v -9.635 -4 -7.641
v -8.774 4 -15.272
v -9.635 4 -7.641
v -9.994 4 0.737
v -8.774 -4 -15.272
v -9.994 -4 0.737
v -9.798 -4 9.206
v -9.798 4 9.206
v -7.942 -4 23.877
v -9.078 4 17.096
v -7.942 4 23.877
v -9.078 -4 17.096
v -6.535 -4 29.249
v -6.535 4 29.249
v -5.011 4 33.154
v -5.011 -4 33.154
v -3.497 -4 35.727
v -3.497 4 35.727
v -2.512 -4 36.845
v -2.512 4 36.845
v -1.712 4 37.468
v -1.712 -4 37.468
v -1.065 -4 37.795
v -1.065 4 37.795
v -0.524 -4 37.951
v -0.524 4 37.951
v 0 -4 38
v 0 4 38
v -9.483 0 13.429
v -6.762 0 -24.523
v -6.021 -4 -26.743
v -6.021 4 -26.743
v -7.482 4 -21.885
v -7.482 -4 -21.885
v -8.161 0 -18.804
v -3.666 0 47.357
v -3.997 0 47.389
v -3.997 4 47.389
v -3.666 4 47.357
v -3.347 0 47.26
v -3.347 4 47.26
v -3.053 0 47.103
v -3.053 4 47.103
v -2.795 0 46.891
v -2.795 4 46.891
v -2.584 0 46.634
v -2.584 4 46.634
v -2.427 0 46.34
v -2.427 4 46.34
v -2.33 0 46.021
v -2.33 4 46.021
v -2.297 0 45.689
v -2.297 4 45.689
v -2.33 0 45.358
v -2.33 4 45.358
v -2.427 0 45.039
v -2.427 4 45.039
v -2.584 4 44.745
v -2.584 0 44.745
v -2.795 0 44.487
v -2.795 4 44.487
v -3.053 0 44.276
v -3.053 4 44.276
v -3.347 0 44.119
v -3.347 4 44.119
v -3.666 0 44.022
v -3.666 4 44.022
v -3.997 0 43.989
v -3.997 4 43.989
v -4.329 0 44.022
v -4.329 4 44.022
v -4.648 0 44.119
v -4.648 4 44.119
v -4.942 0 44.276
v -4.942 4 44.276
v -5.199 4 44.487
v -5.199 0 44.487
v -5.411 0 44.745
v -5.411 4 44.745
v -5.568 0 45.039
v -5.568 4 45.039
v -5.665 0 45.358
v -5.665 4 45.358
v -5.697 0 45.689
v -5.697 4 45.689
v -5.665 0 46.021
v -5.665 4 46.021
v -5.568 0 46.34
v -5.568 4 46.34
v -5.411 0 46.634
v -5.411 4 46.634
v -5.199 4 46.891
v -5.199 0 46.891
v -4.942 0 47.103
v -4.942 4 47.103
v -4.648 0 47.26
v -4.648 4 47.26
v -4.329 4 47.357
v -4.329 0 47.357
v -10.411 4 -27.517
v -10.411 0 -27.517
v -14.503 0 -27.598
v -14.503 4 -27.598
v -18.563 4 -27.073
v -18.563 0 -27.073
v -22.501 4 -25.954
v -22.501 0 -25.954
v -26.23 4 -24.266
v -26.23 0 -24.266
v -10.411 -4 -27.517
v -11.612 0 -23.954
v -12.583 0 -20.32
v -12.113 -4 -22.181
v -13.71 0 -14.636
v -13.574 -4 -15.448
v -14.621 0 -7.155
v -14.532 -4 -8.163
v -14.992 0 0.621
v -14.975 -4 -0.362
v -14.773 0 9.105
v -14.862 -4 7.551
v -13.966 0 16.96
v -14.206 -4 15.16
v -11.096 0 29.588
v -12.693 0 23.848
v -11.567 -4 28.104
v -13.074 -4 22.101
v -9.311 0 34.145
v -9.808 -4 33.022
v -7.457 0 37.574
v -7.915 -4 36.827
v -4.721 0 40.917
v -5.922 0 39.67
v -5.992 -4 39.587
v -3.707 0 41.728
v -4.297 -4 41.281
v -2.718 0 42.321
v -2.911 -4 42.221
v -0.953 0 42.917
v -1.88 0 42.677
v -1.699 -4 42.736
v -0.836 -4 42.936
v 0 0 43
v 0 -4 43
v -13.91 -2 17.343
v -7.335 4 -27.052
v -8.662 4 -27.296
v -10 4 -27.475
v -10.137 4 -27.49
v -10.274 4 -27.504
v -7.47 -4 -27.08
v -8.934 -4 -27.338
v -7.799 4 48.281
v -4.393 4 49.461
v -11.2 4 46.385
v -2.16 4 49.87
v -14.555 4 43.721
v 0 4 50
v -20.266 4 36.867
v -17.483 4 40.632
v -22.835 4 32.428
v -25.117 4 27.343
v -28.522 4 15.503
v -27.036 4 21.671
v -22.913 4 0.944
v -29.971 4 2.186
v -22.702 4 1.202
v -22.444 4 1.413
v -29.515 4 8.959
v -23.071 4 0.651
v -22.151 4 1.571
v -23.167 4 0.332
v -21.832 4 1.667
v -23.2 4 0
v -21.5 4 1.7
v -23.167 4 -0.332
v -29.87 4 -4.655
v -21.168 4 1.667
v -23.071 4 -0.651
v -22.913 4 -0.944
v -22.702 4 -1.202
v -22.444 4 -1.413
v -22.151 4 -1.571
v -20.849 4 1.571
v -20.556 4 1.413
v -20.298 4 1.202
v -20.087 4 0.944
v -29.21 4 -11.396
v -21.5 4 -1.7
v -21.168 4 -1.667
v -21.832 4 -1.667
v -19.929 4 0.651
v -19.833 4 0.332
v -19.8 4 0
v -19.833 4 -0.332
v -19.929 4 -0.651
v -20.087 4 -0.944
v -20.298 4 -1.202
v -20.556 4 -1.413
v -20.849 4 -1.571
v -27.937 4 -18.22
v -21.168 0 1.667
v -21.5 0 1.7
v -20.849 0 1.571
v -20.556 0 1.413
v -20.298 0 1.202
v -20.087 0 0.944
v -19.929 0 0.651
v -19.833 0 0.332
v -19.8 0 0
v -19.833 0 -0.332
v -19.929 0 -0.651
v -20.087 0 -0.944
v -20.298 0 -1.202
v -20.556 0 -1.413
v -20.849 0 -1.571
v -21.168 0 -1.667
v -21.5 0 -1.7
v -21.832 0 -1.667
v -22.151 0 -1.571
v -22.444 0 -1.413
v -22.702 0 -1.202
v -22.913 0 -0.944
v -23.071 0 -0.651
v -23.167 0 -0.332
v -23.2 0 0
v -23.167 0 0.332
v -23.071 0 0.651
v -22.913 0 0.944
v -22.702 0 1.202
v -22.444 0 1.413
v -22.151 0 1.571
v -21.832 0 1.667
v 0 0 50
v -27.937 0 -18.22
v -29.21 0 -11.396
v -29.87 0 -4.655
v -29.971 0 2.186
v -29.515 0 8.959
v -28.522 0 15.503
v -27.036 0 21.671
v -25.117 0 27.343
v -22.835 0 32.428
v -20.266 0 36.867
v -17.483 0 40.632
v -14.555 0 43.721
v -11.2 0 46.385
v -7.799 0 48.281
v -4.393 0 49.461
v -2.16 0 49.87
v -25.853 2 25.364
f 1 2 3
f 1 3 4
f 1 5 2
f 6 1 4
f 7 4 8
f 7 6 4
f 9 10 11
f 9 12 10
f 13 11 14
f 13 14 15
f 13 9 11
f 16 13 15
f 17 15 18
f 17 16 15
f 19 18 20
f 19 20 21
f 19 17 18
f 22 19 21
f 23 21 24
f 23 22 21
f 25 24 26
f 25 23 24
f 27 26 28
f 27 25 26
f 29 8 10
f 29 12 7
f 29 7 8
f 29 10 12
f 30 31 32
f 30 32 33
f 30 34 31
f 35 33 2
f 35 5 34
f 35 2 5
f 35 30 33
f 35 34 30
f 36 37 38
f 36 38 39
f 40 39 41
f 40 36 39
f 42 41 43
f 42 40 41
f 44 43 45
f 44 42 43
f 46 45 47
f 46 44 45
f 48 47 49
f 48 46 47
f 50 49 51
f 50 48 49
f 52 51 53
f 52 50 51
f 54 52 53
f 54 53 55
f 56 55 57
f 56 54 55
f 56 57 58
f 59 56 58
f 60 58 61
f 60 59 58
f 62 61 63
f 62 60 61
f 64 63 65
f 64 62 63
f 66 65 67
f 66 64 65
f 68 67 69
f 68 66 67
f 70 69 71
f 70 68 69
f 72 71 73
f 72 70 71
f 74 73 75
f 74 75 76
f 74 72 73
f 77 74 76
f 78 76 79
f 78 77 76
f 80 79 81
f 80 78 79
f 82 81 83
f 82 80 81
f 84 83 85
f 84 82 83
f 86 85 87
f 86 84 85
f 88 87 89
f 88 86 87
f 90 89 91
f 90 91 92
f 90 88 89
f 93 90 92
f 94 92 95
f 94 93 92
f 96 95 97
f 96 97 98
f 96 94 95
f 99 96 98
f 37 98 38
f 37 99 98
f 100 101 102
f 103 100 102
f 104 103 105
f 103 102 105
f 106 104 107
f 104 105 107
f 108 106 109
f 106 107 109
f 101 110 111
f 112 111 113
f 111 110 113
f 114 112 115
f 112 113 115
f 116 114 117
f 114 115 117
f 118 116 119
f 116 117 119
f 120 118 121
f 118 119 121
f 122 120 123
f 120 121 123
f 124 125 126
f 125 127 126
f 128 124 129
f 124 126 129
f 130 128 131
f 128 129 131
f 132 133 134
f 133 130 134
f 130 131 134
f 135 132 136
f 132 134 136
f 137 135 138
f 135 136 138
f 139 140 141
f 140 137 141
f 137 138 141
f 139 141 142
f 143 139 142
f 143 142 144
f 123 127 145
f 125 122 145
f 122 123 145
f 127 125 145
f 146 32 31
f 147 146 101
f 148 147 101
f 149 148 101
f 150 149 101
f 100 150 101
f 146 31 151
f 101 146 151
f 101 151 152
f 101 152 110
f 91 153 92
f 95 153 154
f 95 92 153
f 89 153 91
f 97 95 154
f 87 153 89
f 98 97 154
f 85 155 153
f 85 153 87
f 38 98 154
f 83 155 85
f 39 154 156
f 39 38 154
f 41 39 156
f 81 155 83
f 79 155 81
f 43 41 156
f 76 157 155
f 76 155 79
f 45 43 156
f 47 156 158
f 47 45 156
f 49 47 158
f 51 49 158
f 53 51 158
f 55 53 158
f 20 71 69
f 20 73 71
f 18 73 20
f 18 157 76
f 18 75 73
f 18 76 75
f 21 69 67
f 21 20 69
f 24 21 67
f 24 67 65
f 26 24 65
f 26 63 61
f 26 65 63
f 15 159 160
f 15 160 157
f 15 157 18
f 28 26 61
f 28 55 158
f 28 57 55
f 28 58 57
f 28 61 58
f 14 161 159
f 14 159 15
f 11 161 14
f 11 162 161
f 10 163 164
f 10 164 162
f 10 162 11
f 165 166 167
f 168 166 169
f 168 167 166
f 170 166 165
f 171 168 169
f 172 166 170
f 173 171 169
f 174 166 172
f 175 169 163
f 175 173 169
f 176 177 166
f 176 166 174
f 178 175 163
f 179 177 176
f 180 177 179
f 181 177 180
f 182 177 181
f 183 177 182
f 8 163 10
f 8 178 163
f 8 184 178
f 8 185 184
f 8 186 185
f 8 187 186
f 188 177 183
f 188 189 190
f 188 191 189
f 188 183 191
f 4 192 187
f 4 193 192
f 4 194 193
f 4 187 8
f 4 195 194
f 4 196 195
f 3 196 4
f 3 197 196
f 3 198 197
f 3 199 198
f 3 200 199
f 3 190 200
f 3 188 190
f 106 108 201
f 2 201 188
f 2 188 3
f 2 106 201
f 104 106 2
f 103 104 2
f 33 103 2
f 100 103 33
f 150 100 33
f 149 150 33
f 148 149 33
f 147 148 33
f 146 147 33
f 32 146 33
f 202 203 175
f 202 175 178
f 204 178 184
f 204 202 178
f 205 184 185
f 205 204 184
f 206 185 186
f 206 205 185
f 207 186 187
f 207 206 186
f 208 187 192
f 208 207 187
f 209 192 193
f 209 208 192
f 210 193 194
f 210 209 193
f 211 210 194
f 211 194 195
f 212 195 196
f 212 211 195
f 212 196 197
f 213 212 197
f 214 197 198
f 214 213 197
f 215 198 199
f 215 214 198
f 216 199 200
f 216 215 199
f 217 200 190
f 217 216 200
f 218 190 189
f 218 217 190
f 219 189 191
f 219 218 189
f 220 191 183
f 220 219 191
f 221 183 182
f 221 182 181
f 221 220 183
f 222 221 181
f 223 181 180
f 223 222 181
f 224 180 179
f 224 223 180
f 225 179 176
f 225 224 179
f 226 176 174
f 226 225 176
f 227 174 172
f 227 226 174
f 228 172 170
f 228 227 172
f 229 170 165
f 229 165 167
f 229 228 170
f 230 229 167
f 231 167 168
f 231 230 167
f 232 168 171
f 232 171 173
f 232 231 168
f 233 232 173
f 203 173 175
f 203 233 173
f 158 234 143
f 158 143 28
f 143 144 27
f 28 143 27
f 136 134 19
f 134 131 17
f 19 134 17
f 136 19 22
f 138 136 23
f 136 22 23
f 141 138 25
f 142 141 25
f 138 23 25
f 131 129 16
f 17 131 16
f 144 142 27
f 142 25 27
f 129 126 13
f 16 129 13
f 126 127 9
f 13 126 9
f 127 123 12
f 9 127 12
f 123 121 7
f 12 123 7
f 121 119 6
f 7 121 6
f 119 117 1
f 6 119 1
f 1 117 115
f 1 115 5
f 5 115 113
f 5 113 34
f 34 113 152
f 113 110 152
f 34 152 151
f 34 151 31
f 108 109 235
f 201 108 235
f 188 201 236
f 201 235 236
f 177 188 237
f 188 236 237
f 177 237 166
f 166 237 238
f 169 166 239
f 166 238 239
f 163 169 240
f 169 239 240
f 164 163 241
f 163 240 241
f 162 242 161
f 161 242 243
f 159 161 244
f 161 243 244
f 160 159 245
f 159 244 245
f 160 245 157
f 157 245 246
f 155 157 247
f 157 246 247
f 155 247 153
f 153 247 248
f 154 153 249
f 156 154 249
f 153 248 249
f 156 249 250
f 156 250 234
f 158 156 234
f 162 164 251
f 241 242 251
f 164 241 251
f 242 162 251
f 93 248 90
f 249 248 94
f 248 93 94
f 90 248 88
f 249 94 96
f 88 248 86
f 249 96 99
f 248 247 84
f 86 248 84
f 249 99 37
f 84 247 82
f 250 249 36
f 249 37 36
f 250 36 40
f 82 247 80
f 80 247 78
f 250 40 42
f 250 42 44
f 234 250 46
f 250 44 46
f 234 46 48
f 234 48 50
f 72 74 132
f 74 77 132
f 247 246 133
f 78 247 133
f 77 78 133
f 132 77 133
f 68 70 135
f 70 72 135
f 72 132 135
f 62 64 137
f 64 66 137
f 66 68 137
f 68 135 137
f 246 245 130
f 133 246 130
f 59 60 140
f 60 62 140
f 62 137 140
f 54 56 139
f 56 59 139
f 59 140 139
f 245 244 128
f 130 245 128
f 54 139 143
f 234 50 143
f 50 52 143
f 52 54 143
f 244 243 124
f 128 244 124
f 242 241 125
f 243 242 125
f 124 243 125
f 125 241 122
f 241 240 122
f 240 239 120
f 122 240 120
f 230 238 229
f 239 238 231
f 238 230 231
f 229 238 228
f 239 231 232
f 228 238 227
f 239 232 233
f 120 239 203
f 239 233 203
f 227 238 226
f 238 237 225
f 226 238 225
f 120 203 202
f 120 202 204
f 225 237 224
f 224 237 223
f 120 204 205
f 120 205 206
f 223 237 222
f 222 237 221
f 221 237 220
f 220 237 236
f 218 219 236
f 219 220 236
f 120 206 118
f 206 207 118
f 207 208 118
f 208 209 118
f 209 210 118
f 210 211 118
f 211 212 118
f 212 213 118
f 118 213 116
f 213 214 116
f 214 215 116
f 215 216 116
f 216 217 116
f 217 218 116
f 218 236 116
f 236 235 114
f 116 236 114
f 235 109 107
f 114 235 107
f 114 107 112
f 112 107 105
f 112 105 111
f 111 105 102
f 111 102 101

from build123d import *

# Parameters (mm, degrees)
SKETCH_1_R      = 1.7
EXTRUDE_1_DEPTH = 4
EXTRUDE_START   = -8
EXTRUDE_2_DEPTH = 8


with BuildPart() as part:
    # Эскиз1 → Бобышка-Вытянуть1 (new body)
    with BuildSketch(Plane(origin=(0, 0, 0), x_dir=(1, 0, 0), z_dir=(0, 1, 0))):
        with BuildLine():
            Line((0, -50), (0, -43))
            add(Edge.make_bspline(
                [(-10.000145873, 27.475174978), (-27.697978685, -43), (0, -43)],
                knots=[4.019246634, 4.019246634, 4.019246634, 6.283185307, 6.283185307, 6.283185307], degree=2, weights=[1, 0.42487789, 1]))
            ThreePointArc((-10.000145873, 27.475174978), (-18.360814479, 27.113576543), (-26.230013338, 24.266254592))
            add(Edge.make_bspline(
                [(-26.230013338, 24.266254592), (-50.964235719, -50), (0, -50)],
                knots=[4.205654034, 4.205654034, 4.205654034, 6.283185307, 6.283185307, 6.283185307], degree=2, weights=[1, 0.507284392, 1]))
        make_face()
        with Locations(Location((-3.997292475, -45.689262056, 0), (0, 0, 270))):
            Circle(SKETCH_1_R, mode=Mode.SUBTRACT)
        with Locations(Location((-21.5, 0, 0), (0, 0, 270))):
            Circle(SKETCH_1_R, mode=Mode.SUBTRACT)
    extrude(amount=EXTRUDE_1_DEPTH)

    # Эскиз2 → Бобышка-Вытянуть2 (add)
    with BuildSketch(Plane(origin=(0, 4, 0), x_dir=(1, 0, 0), z_dir=(0, 1, 0)).offset(EXTRUDE_START)):
        with BuildLine():
            Line((0, -43), (0, -38))
            add(Edge.make_bspline(
                [(-6.021112225, 26.742839981), (-29.868438829, -38), (0, -38)],
                knots=[3.78773541, 3.78773541, 3.78773541, 6.283185307, 6.283185307, 6.283185307], degree=2, weights=[1, 0.317480533, 1]))
            ThreePointArc((-6.021112225, 26.742839981), (-8.200317768, 27.218512364), (-10.410783781, 27.516909787))
            add(Edge.make_bspline(
                [(-10.410783781, 27.516909787), (-37.171364773, -43), (0, -43)],
                knots=[3.908695263, 3.908695263, 3.908695263, 6.283185307, 6.283185307, 6.283185307], degree=2, weights=[1, 0.374216095, 1]))
        make_face()
    extrude(amount=EXTRUDE_2_DEPTH)


solid = part.part
